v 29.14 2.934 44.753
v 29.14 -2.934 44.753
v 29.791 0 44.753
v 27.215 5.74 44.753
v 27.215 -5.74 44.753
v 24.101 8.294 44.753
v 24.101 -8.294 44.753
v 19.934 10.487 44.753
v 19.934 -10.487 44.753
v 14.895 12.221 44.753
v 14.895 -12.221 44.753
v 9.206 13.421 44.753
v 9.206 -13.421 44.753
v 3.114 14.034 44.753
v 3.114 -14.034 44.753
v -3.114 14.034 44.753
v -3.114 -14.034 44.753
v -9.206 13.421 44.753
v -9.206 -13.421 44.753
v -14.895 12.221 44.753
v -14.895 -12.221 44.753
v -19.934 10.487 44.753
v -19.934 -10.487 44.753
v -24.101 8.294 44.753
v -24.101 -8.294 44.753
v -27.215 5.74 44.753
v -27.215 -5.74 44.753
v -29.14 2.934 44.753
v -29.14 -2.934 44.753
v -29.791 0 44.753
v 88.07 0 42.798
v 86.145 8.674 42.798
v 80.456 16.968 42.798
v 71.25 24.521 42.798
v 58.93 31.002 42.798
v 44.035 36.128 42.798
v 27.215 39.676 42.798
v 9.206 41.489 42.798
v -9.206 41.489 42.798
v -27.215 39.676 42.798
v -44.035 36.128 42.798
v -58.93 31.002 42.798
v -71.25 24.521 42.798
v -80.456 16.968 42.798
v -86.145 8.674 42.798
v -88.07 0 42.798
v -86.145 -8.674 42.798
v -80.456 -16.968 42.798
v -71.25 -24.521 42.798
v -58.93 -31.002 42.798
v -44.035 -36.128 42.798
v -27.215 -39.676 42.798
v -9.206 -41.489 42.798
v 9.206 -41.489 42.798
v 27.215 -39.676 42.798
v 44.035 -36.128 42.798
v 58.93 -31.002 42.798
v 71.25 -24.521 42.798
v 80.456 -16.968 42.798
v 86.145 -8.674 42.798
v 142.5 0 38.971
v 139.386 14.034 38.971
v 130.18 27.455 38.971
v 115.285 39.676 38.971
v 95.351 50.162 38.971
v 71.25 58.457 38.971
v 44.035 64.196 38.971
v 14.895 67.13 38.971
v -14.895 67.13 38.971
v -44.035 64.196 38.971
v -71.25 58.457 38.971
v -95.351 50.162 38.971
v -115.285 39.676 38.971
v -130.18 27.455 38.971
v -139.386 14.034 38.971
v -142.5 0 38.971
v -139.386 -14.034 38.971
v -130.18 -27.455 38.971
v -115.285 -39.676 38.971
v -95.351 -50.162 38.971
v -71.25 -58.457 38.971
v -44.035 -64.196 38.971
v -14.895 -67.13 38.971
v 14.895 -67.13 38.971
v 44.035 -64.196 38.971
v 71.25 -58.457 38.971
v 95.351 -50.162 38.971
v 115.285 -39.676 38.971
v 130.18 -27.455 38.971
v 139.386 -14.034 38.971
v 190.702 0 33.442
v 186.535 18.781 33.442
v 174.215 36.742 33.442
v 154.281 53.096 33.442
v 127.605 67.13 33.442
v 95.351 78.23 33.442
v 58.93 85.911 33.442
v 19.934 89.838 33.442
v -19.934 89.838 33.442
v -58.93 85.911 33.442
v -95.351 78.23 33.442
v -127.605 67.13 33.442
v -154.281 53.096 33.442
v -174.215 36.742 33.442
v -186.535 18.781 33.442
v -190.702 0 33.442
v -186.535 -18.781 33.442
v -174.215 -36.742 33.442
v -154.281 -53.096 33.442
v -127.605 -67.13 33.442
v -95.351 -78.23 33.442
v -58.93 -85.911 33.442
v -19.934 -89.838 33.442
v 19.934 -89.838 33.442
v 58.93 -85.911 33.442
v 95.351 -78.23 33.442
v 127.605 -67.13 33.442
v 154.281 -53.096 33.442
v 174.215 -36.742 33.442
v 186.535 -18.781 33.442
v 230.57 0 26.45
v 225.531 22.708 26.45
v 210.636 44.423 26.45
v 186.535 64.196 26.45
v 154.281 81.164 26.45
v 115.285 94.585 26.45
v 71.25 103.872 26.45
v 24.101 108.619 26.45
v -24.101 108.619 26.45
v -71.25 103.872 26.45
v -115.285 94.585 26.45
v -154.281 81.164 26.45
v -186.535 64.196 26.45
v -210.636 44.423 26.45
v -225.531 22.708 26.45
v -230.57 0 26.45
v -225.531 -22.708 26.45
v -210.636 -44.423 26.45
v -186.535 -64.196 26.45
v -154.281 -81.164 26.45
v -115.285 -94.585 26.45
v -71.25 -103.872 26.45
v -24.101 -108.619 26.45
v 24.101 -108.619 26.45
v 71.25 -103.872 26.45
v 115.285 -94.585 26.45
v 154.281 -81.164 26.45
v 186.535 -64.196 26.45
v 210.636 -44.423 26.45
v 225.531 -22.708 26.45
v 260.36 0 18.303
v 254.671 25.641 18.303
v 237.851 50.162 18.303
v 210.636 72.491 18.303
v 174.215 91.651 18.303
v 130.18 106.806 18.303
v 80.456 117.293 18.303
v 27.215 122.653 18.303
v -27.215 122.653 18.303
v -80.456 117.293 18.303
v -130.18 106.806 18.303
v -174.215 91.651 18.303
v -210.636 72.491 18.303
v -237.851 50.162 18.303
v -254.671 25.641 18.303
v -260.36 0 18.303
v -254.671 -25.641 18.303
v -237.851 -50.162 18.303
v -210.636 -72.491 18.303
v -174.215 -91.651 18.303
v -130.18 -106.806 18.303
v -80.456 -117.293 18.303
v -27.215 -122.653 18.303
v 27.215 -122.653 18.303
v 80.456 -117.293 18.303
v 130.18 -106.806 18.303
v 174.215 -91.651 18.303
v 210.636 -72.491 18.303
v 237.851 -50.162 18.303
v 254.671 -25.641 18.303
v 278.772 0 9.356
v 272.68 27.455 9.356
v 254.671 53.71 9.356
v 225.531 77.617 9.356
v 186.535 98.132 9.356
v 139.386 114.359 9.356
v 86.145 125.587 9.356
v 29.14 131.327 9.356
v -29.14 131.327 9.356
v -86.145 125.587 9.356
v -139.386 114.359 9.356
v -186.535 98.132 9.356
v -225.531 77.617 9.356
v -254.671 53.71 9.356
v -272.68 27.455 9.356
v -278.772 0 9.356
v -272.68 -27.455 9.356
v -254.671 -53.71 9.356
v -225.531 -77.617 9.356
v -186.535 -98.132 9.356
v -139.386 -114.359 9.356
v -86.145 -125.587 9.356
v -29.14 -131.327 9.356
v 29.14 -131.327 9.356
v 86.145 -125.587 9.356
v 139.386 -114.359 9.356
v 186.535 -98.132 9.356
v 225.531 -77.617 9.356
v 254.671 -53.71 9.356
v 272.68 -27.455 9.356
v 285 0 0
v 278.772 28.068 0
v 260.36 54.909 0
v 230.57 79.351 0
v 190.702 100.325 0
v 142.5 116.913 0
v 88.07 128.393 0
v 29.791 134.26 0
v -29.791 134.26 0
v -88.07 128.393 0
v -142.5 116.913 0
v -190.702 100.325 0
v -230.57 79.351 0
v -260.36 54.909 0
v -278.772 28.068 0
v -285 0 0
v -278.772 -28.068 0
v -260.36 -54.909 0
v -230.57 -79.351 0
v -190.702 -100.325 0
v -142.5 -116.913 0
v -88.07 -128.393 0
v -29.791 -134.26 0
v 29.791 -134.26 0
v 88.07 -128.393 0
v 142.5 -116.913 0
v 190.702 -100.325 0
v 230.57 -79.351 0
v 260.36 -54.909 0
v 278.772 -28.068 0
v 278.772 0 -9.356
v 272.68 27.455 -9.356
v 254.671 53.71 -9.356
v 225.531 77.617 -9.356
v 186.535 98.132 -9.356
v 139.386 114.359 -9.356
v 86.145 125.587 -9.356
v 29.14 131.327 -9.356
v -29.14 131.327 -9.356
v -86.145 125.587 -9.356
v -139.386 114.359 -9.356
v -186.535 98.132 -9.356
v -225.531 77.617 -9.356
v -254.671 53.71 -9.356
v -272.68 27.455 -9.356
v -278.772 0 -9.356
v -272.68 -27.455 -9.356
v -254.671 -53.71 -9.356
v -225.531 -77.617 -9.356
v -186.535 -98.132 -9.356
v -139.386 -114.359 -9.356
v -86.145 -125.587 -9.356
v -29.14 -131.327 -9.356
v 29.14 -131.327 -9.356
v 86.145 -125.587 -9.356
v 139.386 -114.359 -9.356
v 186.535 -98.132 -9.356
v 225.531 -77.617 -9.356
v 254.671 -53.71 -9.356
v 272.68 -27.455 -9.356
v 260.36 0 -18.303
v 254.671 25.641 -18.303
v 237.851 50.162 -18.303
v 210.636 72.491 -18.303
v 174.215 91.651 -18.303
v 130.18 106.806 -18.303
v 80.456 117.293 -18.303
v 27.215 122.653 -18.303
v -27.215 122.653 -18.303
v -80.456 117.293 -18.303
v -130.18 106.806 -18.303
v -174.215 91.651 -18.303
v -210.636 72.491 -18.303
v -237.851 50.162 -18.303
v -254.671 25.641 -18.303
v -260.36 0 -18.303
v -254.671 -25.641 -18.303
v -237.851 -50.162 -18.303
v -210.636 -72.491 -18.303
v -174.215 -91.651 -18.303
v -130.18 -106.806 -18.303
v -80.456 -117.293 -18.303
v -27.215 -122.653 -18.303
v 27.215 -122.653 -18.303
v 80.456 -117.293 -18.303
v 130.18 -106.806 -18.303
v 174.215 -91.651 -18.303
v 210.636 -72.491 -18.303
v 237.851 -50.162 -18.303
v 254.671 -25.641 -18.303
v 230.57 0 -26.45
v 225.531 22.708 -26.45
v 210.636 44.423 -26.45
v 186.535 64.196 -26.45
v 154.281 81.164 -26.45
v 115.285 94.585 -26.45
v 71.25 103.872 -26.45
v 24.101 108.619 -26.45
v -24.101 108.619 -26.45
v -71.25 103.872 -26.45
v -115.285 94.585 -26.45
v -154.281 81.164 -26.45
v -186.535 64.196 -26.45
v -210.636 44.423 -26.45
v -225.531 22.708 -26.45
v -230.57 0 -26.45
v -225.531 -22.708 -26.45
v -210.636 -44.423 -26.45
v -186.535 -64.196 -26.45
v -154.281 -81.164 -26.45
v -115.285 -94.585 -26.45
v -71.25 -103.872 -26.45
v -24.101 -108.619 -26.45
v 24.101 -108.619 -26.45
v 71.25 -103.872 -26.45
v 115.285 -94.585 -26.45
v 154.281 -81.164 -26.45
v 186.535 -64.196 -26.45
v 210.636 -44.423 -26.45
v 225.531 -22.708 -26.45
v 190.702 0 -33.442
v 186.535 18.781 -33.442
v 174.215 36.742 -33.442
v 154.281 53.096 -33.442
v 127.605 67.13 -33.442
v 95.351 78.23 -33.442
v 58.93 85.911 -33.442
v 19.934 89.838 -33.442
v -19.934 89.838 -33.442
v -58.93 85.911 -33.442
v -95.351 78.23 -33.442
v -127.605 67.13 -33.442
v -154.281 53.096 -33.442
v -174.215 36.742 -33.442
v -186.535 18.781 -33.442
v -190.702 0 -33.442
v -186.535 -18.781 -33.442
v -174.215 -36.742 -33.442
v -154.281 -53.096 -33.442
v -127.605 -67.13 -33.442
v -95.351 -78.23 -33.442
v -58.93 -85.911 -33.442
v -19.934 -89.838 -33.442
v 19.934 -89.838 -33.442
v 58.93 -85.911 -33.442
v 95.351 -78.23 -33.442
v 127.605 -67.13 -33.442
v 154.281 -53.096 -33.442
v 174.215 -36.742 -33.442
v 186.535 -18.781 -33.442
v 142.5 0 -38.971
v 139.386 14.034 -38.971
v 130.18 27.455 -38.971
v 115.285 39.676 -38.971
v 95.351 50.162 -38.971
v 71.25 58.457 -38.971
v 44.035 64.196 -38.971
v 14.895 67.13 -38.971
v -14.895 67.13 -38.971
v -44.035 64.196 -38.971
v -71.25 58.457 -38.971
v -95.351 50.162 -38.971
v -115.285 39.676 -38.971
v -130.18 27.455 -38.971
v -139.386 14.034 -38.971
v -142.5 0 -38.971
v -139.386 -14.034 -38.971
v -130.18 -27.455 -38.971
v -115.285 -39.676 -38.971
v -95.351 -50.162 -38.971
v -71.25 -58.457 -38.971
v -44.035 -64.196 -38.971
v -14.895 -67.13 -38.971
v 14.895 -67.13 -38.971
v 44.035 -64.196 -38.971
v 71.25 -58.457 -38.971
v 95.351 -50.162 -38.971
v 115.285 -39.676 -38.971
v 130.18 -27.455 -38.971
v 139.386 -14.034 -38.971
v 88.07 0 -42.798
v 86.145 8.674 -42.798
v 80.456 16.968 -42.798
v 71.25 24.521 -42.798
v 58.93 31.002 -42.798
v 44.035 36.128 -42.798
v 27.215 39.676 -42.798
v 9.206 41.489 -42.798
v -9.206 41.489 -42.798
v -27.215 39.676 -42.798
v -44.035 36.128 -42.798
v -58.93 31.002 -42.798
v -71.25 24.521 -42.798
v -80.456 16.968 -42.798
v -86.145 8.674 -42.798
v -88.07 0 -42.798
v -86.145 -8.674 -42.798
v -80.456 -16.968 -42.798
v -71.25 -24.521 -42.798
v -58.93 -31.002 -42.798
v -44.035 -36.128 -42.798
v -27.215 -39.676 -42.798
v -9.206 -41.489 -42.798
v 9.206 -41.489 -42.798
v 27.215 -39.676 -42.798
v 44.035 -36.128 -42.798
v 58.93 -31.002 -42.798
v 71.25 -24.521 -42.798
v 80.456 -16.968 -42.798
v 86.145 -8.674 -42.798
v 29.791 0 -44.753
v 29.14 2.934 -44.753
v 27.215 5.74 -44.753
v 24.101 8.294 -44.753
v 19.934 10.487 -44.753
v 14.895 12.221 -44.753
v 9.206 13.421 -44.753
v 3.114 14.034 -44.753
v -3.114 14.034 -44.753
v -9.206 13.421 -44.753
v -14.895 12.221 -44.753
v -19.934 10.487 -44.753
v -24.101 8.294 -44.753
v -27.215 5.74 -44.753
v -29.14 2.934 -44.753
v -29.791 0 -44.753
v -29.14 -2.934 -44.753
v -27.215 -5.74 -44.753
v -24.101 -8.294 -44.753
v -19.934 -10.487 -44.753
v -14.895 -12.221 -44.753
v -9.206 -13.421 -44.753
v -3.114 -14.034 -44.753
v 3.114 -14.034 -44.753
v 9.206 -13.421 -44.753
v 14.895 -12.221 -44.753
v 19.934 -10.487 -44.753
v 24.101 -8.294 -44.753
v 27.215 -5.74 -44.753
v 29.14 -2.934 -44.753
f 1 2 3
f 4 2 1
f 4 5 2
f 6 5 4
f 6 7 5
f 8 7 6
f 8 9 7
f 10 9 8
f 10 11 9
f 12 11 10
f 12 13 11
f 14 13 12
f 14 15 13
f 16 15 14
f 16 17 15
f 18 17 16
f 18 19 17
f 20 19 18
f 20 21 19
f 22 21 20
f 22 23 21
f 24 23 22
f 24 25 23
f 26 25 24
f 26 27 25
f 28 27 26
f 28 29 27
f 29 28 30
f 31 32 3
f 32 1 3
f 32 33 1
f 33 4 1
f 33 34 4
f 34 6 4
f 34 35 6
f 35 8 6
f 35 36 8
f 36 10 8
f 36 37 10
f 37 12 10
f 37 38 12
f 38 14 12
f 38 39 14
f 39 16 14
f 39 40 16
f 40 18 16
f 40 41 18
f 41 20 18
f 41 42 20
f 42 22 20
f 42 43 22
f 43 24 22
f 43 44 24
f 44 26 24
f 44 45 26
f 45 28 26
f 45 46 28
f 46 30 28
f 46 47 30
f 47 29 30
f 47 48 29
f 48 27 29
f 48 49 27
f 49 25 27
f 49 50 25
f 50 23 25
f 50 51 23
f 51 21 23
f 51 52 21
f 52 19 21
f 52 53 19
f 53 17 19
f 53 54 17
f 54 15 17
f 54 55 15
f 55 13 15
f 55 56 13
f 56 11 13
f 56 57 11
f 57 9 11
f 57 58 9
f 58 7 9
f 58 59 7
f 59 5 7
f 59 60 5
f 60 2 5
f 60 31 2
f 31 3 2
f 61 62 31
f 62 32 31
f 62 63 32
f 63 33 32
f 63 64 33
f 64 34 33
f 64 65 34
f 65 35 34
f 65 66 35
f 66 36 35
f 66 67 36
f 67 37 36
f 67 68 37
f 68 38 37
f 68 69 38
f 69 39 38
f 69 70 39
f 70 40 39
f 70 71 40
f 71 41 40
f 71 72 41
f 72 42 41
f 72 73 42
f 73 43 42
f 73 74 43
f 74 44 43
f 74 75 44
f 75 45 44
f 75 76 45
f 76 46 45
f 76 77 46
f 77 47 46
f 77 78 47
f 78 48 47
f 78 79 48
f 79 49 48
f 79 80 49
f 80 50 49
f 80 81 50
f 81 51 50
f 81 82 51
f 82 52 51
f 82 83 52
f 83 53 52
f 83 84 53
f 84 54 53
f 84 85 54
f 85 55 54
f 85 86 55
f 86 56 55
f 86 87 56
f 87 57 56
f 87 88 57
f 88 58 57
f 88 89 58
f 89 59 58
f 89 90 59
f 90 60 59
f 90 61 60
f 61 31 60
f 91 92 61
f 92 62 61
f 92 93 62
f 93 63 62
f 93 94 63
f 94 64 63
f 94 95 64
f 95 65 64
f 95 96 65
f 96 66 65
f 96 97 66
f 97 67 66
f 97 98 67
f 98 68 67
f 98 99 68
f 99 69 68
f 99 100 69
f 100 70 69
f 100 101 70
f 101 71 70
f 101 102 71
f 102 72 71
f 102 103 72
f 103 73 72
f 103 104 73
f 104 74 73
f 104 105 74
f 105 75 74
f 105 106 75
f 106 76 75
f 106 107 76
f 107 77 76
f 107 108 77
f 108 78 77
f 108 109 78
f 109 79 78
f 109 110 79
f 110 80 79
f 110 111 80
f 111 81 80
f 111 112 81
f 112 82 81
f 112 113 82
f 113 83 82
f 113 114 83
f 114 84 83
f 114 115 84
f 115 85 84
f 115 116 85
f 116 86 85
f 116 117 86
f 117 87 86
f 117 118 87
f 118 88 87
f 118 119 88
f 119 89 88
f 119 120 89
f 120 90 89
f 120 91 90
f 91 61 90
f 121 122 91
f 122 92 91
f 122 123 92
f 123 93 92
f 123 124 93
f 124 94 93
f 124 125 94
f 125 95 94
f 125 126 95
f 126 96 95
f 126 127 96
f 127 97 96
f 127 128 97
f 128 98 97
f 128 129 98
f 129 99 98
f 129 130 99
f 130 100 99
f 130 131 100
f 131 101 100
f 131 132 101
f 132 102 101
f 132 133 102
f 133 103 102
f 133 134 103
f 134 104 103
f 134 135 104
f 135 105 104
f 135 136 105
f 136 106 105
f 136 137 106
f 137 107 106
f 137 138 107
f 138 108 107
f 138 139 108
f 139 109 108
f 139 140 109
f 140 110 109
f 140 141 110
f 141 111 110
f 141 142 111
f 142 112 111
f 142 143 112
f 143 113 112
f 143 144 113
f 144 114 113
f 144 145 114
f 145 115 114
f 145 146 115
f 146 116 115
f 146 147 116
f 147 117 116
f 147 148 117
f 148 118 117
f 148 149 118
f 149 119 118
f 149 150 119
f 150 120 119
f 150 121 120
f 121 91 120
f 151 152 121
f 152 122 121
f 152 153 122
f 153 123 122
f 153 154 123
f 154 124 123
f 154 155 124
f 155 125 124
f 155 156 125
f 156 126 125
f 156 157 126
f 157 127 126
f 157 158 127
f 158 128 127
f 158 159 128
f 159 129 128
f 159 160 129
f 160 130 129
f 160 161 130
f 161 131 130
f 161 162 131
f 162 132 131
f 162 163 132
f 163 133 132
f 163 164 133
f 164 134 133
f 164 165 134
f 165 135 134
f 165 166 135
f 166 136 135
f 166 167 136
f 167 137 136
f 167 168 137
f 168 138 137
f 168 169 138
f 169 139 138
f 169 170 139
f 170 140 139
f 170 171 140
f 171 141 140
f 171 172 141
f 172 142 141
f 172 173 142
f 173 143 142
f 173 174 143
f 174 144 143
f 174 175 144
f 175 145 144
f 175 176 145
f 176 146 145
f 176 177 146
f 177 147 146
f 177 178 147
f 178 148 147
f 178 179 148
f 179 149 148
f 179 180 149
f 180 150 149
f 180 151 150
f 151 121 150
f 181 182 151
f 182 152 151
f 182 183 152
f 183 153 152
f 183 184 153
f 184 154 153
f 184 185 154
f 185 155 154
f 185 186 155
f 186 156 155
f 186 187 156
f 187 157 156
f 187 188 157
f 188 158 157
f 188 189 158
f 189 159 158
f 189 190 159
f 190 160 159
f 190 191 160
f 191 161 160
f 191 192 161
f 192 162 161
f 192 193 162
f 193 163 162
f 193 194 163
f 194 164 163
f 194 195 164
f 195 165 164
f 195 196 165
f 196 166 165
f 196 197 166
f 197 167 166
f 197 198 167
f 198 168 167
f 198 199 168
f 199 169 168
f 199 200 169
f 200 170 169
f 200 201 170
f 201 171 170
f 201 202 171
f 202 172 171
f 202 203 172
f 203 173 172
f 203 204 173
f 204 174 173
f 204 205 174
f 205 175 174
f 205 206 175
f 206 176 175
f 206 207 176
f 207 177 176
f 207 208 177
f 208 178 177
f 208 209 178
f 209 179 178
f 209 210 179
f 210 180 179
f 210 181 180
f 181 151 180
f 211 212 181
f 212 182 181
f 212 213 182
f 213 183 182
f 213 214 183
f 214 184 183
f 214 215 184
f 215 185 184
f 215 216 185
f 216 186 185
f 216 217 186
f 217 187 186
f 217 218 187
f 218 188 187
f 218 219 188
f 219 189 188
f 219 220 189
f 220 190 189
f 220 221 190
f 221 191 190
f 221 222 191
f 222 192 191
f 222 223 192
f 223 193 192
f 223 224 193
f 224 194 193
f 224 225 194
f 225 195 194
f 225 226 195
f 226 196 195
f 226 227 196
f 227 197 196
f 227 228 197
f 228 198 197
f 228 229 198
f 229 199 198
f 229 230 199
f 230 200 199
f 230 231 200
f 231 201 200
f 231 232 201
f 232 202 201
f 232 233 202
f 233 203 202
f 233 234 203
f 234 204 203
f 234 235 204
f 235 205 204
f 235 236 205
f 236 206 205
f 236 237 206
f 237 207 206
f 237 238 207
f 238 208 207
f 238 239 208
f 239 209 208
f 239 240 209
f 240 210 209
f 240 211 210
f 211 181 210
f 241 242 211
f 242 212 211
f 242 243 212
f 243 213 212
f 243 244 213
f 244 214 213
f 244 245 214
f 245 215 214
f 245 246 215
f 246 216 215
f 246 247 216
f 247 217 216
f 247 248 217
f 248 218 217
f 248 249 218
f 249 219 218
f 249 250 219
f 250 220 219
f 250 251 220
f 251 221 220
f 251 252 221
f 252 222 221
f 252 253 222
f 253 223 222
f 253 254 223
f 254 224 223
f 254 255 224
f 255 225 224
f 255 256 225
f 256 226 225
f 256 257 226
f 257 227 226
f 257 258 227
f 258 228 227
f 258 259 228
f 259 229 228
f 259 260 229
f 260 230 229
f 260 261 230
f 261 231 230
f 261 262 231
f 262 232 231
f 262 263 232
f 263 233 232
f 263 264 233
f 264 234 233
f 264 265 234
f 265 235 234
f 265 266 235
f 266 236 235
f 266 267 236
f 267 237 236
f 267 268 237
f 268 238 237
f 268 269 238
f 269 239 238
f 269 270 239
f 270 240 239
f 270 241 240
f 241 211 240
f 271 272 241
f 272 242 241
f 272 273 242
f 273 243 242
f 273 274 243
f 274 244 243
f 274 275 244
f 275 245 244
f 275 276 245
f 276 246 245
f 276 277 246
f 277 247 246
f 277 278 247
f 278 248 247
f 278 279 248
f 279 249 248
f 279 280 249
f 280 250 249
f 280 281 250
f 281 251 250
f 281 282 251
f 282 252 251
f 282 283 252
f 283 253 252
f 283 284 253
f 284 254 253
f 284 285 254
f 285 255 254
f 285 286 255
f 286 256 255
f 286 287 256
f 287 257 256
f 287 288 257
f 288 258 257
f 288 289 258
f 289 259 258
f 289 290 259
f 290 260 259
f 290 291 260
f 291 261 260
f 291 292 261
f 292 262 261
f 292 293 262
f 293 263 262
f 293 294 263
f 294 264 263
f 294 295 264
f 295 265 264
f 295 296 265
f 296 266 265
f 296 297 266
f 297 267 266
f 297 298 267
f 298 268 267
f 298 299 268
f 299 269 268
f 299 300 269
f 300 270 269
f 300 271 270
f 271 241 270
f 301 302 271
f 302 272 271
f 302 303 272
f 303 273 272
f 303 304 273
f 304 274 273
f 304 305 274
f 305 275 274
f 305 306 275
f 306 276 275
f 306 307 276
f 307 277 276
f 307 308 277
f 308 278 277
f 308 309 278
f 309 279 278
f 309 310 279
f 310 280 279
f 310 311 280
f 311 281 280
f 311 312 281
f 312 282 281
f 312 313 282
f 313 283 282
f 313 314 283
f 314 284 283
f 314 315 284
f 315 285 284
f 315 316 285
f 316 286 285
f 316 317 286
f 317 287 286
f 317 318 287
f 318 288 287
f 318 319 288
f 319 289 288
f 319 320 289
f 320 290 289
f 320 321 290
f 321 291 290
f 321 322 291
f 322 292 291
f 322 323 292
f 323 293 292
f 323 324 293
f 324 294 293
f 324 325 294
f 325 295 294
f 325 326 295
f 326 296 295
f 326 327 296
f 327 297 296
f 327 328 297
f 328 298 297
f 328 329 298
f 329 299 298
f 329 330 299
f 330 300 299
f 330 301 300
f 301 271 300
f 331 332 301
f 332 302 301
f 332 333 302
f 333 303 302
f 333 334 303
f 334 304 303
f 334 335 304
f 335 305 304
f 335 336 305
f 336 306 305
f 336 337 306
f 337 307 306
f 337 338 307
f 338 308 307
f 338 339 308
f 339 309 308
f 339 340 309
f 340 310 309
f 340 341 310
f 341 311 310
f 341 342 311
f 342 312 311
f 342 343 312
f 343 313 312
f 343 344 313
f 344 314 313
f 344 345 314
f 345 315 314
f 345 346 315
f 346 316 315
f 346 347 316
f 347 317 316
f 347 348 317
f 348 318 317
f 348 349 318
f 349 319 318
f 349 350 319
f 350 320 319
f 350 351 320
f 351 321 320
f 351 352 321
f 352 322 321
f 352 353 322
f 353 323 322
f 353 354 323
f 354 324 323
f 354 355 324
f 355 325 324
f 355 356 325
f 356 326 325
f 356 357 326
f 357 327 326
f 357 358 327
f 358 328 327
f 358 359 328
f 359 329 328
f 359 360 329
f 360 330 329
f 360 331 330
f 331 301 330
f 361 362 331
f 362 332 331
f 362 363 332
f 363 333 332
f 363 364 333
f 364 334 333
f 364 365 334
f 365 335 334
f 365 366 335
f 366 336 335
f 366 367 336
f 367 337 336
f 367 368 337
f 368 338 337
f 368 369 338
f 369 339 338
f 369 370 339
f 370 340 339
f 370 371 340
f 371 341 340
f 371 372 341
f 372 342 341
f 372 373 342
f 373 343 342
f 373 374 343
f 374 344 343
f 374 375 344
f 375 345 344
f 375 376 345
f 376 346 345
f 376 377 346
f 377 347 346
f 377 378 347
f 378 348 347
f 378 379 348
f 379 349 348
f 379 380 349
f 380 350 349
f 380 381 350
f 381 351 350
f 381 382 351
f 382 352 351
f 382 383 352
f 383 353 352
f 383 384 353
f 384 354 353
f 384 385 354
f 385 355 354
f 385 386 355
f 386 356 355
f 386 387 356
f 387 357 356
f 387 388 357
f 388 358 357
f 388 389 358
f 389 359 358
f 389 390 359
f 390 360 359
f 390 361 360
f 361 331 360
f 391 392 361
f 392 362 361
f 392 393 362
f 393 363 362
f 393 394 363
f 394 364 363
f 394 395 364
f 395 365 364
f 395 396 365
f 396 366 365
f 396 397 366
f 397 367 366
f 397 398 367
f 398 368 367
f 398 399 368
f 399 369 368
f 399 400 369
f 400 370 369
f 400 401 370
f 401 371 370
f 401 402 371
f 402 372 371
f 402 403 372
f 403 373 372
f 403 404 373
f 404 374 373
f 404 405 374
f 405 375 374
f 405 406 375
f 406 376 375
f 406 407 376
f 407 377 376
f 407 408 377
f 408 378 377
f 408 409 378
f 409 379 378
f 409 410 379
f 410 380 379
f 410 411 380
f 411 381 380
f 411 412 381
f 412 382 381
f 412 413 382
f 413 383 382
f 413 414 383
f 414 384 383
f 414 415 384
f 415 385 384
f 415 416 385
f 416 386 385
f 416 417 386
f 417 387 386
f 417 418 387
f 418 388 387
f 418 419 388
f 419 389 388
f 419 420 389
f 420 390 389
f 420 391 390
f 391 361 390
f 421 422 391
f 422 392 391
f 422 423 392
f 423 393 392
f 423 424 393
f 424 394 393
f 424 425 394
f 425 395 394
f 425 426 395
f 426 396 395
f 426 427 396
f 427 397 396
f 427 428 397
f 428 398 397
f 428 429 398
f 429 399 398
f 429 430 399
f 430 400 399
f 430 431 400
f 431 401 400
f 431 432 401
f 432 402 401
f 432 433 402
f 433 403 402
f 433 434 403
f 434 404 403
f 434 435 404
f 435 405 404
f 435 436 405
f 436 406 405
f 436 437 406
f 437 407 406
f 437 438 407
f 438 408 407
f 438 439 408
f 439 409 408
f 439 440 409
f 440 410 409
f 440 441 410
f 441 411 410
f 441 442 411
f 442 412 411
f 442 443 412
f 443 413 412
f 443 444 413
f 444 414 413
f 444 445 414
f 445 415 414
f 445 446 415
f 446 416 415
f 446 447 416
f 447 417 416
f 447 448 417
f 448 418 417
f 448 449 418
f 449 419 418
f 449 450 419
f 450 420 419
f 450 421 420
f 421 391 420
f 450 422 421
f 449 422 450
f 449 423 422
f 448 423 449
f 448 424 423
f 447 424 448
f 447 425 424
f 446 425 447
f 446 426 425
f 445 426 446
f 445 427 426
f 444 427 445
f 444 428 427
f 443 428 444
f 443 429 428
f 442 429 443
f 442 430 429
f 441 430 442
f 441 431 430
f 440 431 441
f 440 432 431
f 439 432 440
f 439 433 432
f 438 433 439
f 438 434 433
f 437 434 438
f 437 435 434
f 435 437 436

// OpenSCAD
// Generated by SolidPython 1.0.1 on 2020-07-29 00:46:53


scale(v = [19, 9, 3]) {
	sphere(r = 15);
}
/***********************************************
*********      SolidPython code:      **********
************************************************
 
# import packages: SolidPython
from solid import *
from solid.utils import *
from itertools import chain, combinations, permutations


class Resize:

    def __init__(self, scad_file):
        self.scad_file = scad_file
        #self.scad_file = import_scad(scad_file)
        # cone/cylinder param:
        self.r1 = 0
        self.r2 = 0
        self.h = 0
        # rectangular prism param:
        self.w = 0
        self.l = 0
        # ellipse param:
        self.r = 0

    # import OpenScad code (file name corresponds to shape)


    # classify shape + parameters
    def assign(self, param1, param2, param3):
        if self.scad_file == 'cone.scad':
            self.r1 = param1
            self.r2 = param2
            self.h = param3
        elif self.scad_file == 'cylinder.scad':
            self.r1 = param1
            self.r2 = param2
            self.h = param3
        elif self.scad_file == 'rectangularPrism.scad':
            self.h = param1
            self.l = param2
            self.w = param3
        else:
            self.r = param1
            self.h = param2

    # resize parameters
    def iterate(self):
        x = range(3, 20, 2)
        i = 1
        if self.scad_file == 'cone.scad':
            tempList = list(permutations(x, 2))
            for temp in tempList:
                param1 = temp[0]
                param2 = temp[1]
                filepath = 'produced_scad_files/' + 'cone' + str(param1) + '_' + str(param2) + '_' + '.scad'
                scad_render_to_file(cylinder(h=param1, r1=param2, r2=0), filepath)

        elif self.scad_file == 'cylinder.scad':
            tempList = list(permutations(x, 3))
            for temp in tempList:
                param1 = temp[0]
                param2 = temp[1]
                filepath = 'produced_scad_files/' + 'cylinder' + str(param1) + '_' + str(param2) + '_' + '.scad'
                scad_render_to_file(cylinder(h=param1, r1=param2, r2=param2), filepath)

        elif self.scad_file == 'rectangularPrism.scad':
            tempList = list(permutations(x, 3))
            for temp in tempList:
                param1 = temp[0]
                param2 = temp[1]
                param3 = temp[2]
                filepath = 'produced_scad_files/' + 'rectangularPrism' + str(param1) + '_' + str(param2) + '_' + str(
                    param3) + '.scad'
                scad_render_to_file(cube(size=(param1, param2, param3)), filepath)

        elif self.scad_file == 'ellipse.scad':
            tempList = list(permutations(x, 4))
            for temp in tempList:
                param1 = temp[0]
                param2 = temp[1]
                param3 = temp[2]
                param4 = temp[3]
                filepath = 'produced_scad_files/' + 'ellipse' + str(param1) + '_' + str(param2) + '_' + str(param3) + '_' + str(param4) + '.scad'
                scad_render_to_file(scale([param1, param2, param3])(sphere(r=param4)), filepath)

    def render_to_scadfile(self):
        scad_render_to_file(scad, 'example.scad') 
 
************************************************/
